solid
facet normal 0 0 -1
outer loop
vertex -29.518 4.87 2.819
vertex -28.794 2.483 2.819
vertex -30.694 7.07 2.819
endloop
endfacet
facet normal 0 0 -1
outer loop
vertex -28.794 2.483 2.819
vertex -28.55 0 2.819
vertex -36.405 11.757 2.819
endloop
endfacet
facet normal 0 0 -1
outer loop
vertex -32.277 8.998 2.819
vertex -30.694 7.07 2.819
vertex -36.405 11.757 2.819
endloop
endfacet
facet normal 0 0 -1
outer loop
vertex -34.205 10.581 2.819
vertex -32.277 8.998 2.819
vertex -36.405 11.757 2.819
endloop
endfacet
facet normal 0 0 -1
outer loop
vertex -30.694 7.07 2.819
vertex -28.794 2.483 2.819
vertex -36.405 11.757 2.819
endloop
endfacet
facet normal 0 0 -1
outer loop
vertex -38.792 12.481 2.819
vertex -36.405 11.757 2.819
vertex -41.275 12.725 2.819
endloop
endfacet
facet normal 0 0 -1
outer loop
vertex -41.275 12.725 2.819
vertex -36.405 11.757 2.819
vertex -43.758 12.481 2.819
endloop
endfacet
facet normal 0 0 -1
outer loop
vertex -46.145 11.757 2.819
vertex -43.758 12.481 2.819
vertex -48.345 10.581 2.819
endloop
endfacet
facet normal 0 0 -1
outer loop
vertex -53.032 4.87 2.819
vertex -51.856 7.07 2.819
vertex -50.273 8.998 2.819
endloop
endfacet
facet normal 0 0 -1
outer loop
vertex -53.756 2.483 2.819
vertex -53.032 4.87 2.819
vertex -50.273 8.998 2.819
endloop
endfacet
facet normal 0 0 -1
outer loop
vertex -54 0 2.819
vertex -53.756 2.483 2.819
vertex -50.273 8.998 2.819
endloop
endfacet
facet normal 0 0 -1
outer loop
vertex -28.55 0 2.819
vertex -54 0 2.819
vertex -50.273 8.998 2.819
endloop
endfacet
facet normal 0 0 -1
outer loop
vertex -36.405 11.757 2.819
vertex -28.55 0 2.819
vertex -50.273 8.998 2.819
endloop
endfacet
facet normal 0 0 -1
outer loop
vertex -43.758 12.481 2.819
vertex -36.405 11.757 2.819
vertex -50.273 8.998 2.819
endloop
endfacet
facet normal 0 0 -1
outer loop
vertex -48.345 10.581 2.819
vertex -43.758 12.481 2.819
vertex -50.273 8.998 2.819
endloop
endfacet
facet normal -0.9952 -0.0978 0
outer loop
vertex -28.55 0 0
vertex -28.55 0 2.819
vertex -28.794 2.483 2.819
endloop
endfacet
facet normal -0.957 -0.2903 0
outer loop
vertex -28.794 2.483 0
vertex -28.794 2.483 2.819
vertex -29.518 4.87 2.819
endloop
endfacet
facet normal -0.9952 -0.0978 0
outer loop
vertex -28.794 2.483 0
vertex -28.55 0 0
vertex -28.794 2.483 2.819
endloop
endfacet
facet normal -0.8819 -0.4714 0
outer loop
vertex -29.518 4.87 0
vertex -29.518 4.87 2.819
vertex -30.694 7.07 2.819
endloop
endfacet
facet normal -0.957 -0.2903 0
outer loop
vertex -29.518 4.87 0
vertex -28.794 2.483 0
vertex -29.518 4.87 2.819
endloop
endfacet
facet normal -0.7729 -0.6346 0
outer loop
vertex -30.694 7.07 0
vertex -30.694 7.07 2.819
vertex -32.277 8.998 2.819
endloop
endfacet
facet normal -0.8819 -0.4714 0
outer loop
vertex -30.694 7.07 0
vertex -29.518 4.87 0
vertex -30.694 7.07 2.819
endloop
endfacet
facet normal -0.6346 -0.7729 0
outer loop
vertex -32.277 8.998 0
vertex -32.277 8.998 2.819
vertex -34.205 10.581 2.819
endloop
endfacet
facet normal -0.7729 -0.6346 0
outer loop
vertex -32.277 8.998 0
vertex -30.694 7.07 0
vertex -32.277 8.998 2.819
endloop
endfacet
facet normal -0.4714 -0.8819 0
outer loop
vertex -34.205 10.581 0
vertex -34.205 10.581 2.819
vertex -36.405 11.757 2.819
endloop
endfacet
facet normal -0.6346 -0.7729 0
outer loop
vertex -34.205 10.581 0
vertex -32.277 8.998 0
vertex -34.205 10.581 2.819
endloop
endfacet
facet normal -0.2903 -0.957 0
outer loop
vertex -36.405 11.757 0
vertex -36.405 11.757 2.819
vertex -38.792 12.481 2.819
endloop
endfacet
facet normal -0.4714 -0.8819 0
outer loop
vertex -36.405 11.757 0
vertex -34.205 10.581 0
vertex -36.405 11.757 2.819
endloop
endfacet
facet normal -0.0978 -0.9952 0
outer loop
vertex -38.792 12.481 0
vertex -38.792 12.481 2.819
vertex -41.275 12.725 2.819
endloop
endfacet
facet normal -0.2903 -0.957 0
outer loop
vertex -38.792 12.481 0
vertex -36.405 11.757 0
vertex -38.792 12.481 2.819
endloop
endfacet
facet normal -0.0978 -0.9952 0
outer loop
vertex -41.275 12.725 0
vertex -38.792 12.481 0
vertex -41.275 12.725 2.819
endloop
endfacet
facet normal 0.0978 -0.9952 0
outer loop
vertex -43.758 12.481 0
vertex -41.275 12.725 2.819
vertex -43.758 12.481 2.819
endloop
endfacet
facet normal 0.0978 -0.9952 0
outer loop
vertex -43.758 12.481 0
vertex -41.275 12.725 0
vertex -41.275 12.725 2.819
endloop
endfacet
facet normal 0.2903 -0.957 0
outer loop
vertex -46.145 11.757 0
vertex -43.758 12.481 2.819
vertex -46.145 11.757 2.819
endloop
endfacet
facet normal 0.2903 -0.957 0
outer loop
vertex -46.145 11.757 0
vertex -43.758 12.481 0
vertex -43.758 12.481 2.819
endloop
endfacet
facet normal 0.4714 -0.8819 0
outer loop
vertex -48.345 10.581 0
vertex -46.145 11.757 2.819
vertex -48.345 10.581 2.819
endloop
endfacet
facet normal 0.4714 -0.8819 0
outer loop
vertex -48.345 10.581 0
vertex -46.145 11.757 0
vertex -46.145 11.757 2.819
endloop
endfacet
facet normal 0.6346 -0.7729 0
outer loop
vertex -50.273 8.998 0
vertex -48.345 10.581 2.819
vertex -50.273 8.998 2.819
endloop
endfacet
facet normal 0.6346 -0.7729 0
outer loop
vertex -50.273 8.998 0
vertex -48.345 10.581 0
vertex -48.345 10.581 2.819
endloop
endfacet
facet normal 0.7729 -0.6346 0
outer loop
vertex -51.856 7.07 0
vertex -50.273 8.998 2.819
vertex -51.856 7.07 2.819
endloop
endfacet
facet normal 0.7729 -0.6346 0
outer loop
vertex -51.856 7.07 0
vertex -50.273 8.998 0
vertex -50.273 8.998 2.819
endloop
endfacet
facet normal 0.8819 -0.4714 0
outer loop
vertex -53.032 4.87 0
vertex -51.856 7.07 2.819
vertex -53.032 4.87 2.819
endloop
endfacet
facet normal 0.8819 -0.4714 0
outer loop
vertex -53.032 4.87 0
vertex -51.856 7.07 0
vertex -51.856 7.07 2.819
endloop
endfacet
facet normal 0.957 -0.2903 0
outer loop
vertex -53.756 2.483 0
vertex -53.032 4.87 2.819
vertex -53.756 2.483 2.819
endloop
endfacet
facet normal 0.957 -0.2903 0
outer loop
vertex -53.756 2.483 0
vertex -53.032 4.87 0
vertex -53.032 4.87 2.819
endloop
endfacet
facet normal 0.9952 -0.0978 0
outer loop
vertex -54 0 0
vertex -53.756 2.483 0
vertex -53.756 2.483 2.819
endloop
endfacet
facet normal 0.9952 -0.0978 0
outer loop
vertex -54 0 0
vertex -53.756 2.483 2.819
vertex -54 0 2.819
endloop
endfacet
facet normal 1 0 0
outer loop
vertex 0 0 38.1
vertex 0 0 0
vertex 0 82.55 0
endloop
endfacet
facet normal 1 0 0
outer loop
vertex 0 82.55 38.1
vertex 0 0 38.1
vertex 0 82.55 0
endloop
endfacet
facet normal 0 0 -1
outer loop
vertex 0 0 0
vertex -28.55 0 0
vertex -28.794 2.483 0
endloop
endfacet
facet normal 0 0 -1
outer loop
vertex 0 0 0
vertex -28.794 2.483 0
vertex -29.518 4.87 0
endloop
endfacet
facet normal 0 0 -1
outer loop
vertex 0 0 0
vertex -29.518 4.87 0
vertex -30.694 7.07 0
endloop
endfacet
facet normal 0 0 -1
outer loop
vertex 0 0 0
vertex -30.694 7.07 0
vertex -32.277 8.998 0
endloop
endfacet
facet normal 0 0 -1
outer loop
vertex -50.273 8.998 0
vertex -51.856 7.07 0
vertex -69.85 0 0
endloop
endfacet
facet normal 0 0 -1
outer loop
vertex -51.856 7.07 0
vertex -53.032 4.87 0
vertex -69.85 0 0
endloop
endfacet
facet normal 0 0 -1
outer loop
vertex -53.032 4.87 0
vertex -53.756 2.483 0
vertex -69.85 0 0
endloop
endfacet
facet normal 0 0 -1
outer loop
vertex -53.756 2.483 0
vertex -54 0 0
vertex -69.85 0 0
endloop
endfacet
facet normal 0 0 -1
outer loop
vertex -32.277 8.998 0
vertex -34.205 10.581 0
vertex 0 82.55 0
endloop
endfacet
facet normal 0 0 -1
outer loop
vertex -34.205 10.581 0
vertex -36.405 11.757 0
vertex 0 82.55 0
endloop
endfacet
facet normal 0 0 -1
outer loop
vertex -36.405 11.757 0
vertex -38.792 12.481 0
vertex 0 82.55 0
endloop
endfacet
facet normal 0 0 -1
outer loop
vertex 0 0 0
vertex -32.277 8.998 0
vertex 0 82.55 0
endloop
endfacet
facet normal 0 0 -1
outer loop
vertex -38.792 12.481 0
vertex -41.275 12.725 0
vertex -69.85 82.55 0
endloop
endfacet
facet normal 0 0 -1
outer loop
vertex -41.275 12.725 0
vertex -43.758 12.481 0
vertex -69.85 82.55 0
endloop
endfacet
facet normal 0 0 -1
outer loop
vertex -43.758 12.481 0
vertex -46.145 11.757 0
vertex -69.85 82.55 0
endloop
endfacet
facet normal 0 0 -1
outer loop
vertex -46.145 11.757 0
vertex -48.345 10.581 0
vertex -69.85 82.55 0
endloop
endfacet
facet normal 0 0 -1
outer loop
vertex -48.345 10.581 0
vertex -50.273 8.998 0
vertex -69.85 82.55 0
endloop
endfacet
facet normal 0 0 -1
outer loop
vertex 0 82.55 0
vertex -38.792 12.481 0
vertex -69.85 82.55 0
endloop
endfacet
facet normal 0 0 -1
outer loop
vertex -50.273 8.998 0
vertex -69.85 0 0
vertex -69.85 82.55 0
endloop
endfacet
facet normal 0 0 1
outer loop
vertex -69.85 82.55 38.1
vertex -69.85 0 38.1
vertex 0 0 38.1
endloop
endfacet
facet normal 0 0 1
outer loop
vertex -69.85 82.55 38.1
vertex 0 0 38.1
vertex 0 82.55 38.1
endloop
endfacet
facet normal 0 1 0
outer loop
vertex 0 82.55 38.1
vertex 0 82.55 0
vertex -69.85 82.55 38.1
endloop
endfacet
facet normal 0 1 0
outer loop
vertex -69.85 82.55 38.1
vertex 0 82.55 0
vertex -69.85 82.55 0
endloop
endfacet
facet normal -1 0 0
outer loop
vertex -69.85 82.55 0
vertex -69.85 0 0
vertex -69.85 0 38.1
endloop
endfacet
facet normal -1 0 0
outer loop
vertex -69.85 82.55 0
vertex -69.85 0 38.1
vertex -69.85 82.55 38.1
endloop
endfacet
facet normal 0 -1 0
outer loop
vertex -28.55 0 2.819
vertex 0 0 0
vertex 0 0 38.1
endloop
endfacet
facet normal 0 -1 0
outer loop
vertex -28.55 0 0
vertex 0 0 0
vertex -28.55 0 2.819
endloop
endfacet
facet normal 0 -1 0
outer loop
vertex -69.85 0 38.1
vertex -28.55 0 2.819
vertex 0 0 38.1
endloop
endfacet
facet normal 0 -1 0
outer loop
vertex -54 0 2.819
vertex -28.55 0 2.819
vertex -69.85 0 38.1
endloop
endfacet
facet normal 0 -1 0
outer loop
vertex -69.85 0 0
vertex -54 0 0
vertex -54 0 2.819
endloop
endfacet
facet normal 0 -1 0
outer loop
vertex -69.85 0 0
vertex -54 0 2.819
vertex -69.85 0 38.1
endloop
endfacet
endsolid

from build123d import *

# Parameters (mm, degrees)
SKETCH1_W           = 82.55
SKETCH1_H           = 69.85
BOSS_EXTRUDE1_DEPTH = 38.1
SKETCH2_R           = 12.7254
CUT_EXTRUDE1_DEPTH  = 2.8194


with BuildPart() as part:
    # Sketch1 → Boss-Extrude1 (new body)
    with BuildSketch(Plane(origin=(0, 0, 0), x_dir=(0, 1, 0), z_dir=(0, 0, 1))):
        with Locations((41.275, 34.925)):
            Rectangle(SKETCH1_W, SKETCH1_H)
    extrude(amount=BOSS_EXTRUDE1_DEPTH)

    # Sketch2 → Cut-Extrude1 (cut)
    with BuildSketch(Plane(origin=(0, 0, 0), x_dir=(0, 1, 0), z_dir=(0, 0, 1))):
        with Locations((0, 41.275)):
            Circle(SKETCH2_R)
    extrude(amount=CUT_EXTRUDE1_DEPTH, mode=Mode.SUBTRACT)


solid = part.part
